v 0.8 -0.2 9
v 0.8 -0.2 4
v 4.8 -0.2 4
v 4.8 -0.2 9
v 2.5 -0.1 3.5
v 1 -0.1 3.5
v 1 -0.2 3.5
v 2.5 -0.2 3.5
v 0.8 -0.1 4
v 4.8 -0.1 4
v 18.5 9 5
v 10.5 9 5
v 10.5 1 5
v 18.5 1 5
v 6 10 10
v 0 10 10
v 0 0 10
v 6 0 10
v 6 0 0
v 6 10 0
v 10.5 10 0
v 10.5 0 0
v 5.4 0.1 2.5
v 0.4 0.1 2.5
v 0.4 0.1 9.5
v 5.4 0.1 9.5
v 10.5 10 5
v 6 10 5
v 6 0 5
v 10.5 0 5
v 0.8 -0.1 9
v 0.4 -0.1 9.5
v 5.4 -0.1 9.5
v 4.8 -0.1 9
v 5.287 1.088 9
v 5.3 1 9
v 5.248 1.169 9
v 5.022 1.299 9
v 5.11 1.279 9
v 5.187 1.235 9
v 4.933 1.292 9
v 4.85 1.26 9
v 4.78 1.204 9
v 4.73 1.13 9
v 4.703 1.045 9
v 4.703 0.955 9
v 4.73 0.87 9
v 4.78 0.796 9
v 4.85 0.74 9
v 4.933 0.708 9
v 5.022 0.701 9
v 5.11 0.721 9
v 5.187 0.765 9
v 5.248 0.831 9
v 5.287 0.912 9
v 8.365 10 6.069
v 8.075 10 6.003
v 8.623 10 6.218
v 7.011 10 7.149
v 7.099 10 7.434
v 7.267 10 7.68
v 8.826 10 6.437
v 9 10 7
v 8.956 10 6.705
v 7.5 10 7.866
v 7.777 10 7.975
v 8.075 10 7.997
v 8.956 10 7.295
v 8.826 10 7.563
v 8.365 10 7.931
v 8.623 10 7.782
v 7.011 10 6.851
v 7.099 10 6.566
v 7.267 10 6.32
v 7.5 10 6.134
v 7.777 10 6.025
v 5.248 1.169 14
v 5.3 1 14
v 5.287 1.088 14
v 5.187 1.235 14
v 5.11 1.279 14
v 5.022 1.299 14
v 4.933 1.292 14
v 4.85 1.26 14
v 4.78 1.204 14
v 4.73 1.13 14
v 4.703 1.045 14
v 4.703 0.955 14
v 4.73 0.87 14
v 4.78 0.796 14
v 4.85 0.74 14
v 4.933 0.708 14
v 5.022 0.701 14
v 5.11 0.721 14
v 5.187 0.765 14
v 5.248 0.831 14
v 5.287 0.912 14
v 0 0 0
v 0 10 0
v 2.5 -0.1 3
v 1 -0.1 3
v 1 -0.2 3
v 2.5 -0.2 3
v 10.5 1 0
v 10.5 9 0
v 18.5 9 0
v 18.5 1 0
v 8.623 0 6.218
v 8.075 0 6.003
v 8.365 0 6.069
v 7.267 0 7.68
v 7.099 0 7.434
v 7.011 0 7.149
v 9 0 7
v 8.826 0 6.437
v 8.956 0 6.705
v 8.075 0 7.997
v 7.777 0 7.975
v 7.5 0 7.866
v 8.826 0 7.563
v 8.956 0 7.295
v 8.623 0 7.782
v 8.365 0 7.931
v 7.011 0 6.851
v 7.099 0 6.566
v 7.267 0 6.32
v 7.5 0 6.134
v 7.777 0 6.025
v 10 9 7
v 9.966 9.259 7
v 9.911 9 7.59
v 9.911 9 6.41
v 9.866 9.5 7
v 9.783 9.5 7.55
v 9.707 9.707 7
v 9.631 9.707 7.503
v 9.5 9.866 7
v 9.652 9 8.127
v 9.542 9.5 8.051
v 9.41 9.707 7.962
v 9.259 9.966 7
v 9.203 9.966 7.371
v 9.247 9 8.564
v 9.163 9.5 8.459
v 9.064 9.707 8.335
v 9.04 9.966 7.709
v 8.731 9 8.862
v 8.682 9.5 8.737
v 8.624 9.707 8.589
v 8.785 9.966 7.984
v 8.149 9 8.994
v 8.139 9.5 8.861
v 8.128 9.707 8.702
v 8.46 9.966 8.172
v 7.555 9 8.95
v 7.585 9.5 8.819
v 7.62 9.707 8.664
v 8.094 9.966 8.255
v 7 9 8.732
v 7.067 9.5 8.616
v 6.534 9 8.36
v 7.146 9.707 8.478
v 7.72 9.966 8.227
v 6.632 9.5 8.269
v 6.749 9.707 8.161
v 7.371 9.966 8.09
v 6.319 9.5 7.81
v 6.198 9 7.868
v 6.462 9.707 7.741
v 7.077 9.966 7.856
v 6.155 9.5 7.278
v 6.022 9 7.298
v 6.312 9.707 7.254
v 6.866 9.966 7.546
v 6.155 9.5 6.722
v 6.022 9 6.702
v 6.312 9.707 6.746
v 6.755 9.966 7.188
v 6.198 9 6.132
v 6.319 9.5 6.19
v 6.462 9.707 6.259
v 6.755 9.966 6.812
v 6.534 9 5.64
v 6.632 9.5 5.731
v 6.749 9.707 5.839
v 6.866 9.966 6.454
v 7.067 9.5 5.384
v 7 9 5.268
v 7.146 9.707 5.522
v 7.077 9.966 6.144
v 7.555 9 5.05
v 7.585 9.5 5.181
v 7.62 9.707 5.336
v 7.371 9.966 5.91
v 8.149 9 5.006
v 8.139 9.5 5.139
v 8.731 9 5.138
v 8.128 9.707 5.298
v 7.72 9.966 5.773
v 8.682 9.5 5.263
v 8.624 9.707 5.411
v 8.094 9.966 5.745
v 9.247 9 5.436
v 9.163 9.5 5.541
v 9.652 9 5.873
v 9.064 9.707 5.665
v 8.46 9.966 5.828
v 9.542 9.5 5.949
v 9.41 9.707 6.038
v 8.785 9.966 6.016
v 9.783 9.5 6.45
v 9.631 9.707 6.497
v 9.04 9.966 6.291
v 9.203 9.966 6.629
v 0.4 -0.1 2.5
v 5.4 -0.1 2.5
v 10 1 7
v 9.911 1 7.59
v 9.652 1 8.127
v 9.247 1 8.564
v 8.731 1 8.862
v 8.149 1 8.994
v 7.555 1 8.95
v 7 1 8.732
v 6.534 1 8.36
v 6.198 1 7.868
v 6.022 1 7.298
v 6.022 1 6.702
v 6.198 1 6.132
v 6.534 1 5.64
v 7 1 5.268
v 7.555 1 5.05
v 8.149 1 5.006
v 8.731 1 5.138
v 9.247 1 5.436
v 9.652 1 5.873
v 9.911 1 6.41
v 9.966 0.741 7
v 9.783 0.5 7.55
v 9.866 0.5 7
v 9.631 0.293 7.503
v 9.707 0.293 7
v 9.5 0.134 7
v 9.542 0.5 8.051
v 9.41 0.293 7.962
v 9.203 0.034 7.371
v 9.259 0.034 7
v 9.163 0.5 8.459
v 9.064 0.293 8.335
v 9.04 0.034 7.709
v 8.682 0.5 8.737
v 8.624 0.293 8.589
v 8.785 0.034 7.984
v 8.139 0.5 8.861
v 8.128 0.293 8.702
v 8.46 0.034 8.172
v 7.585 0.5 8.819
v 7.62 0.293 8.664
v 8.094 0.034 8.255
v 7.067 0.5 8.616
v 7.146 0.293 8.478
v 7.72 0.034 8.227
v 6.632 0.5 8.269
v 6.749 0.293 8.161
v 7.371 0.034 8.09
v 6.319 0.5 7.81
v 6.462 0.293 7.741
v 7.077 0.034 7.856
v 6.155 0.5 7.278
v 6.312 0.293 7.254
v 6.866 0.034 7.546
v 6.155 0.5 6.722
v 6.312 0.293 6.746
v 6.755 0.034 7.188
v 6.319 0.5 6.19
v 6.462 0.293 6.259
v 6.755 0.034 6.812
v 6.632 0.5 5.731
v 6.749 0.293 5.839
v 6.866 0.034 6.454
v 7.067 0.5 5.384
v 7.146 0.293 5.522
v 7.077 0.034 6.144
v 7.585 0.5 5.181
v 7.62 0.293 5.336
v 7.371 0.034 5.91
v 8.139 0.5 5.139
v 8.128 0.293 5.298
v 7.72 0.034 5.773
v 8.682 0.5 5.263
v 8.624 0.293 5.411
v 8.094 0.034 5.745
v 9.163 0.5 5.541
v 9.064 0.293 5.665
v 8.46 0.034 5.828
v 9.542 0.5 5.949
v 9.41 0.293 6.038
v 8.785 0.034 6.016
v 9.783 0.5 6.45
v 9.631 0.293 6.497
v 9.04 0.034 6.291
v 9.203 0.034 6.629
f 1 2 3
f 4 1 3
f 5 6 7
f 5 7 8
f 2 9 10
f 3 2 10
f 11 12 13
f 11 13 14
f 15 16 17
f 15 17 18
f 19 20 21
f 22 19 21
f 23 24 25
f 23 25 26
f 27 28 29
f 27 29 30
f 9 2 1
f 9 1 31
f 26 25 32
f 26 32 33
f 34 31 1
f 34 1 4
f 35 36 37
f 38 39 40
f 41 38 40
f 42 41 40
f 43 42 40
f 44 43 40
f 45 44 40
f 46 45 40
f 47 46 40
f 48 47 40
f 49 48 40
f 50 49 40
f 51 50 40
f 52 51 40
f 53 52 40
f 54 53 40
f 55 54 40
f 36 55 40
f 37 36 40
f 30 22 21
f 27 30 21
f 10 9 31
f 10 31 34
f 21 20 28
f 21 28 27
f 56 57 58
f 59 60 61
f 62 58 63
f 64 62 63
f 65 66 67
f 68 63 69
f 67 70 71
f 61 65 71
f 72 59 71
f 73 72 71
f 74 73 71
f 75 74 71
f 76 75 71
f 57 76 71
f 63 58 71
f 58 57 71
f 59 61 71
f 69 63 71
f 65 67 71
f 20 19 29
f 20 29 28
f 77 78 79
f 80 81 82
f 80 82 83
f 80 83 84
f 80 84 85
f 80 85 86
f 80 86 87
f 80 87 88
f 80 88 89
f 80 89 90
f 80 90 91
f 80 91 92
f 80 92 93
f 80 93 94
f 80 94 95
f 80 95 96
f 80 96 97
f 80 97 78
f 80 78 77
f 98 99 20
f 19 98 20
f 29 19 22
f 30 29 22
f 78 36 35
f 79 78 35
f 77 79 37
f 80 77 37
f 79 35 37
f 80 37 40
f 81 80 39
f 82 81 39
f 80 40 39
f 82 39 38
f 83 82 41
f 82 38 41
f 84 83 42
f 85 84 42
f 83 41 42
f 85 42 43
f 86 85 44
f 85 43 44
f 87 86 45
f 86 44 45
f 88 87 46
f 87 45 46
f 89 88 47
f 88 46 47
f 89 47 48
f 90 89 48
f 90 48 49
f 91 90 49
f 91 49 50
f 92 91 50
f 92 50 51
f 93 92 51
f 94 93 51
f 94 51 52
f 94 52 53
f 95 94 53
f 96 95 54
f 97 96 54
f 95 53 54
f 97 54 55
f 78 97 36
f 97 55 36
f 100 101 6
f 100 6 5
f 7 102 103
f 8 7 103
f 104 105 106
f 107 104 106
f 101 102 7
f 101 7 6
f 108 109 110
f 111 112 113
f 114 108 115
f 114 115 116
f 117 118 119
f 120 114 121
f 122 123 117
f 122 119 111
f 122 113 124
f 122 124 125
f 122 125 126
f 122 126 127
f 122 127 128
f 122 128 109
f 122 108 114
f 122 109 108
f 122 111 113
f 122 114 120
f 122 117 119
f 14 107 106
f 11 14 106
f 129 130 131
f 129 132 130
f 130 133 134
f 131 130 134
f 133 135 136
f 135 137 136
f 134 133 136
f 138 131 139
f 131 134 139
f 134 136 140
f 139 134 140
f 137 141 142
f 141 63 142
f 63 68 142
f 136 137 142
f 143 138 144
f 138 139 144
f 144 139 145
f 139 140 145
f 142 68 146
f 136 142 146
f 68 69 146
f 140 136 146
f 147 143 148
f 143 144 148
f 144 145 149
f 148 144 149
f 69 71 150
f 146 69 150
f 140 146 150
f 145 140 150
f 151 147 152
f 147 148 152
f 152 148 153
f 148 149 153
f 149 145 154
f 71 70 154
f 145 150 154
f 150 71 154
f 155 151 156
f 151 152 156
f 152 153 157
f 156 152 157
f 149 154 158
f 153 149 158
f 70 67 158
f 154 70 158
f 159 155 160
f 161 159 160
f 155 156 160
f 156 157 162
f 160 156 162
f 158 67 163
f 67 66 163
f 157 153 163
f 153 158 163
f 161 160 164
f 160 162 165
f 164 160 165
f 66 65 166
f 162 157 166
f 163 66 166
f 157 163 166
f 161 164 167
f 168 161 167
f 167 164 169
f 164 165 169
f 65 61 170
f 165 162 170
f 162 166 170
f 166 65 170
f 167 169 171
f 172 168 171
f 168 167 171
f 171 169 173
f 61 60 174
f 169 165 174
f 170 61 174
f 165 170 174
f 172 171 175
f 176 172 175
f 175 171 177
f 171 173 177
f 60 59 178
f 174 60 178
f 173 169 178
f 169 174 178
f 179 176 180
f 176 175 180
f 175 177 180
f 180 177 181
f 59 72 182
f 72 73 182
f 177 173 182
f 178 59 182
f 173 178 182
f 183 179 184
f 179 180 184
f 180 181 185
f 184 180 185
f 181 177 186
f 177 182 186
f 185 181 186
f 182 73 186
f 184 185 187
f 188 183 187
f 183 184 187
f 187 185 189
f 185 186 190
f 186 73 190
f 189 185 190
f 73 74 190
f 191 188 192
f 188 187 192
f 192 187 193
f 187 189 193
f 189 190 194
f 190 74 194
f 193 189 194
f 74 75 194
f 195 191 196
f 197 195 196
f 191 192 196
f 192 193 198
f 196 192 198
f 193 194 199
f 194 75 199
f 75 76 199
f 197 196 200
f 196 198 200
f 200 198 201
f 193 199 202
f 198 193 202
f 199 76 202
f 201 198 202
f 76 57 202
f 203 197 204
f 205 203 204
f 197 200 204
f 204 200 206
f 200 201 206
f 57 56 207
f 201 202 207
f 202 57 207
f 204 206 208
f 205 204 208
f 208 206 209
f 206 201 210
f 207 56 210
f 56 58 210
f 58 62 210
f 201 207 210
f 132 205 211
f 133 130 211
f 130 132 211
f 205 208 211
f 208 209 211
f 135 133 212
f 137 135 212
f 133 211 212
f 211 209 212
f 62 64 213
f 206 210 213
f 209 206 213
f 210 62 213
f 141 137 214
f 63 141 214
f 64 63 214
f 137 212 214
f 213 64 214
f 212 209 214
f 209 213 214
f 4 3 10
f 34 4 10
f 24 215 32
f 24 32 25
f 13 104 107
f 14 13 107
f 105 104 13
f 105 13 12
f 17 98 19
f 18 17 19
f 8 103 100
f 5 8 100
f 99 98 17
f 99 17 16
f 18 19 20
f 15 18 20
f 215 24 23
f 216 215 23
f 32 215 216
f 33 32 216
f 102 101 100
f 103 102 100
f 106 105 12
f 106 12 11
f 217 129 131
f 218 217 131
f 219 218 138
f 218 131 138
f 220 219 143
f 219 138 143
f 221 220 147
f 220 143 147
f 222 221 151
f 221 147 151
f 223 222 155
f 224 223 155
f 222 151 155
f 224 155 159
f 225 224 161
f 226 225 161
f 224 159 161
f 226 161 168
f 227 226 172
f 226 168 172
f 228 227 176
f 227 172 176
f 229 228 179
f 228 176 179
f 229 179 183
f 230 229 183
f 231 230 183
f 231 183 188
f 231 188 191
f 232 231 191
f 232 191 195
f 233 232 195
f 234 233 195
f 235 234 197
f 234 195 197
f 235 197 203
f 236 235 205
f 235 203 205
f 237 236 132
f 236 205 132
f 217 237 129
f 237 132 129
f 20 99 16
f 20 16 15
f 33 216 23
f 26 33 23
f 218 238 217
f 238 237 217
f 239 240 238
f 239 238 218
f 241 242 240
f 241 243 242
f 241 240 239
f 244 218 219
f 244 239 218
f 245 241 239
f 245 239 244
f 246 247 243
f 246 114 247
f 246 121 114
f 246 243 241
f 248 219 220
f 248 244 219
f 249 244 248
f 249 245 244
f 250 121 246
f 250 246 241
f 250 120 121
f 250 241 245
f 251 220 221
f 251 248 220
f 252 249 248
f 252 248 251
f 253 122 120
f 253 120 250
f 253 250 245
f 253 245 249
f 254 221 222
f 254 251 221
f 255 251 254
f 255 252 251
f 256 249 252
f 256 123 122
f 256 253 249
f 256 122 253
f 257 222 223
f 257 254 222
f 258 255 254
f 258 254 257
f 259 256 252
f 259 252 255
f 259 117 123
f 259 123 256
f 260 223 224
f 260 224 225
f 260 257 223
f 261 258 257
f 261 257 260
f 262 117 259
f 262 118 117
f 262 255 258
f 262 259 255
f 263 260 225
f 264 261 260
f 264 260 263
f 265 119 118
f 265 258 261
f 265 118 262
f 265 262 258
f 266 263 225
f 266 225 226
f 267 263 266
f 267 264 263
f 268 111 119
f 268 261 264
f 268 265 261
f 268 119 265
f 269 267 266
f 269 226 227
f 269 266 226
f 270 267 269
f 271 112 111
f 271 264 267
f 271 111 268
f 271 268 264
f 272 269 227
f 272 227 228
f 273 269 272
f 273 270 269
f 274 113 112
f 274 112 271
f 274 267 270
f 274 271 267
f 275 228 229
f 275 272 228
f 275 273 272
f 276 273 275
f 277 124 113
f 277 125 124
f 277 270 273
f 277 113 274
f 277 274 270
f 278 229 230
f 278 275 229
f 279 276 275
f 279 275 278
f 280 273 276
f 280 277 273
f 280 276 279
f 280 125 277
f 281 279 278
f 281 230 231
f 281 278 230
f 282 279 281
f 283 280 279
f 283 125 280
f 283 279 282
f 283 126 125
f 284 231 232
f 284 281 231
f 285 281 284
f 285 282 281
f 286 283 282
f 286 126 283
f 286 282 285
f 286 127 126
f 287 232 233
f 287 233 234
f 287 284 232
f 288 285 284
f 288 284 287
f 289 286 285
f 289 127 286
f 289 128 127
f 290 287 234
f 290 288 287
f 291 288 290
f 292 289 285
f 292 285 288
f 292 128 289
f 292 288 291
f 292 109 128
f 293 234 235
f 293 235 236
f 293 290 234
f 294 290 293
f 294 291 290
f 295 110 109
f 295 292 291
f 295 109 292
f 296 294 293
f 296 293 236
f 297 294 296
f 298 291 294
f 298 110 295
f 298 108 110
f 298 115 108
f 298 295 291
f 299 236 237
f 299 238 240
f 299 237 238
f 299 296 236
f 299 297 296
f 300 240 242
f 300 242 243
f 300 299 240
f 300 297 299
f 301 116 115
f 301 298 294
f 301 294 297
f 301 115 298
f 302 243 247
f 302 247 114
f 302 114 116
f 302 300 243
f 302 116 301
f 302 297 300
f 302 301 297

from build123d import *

# Parameters (mm, degrees)
BOX_W             = 6
BOX_H             = 10
BOX_DEPTH         = 10
BOX001_W          = 4.5
BOX001_H          = 10
BOX001_DEPTH      = 5
CYLINDER_R        = 2
CYLINDER_DEPTH    = 10
FILLET_R          = 1
BOX002_W          = 4
BOX002_H          = 0.1
BOX002_DEPTH      = 5
BOX003_W          = 5
BOX003_H          = 0.2
BOX003_DEPTH      = 7
BOX004_W          = 1.5
BOX004_H          = 0.1
BOX004_DEPTH      = 0.5
CYLINDER001_R     = 0.3
CYLINDER001_DEPTH = 5
BOX005_W          = 8
BOX005_H          = 8
BOX005_DEPTH      = 5


with BuildPart() as cap_camio:
    # Box → Box (new body)
    with BuildSketch(Plane.XY):
        with Locations((3, 5)):
            Rectangle(BOX_W, BOX_H)
    extrude(amount=BOX_DEPTH)


with BuildPart() as darrer_camio:
    # Box001 → Box001 (new body)
    with BuildSketch(Plane(origin=(6, 0, 0), x_dir=(1, 0, 0), z_dir=(0, 0, 1))):
        with Locations((2.25, 5)):
            Rectangle(BOX001_W, BOX001_H)
    extrude(amount=BOX001_DEPTH)


with BuildPart() as combustible:
    # Cylinder → Cylinder (new body)
    with BuildSketch(Plane(origin=(8, 10, 7), x_dir=(1, 0, 0), z_dir=(0, -1, 0))):
        Circle(CYLINDER_R)
    extrude(amount=CYLINDER_DEPTH)

    # Fillet
    fillet_edges = [combustible.edges().sort_by_distance(p)[0] for p in [
        (6, 10, 7),
        (6, 0, 7),
    ]]
    fillet(fillet_edges, radius=FILLET_R)


with BuildPart() as finestra:
    # Box002 → Box002 (new body)
    with BuildSketch(Plane(origin=(0.8, -0.2, 4), x_dir=(1, 0, 0), z_dir=(0, 0, 1))):
        with Locations((2, 0.05)):
            Rectangle(BOX002_W, BOX002_H)
    extrude(amount=BOX002_DEPTH)


with BuildPart() as porta:
    # Box003 → Box003 (new body)
    with BuildSketch(Plane(origin=(0.4, -0.1, 2.5), x_dir=(1, 0, 0), z_dir=(0, 0, 1))):
        with Locations((2.5, 0.1)):
            Rectangle(BOX003_W, BOX003_H)
    extrude(amount=BOX003_DEPTH)


with BuildPart() as maneta:
    # Box004 → Box004 (new body)
    with BuildSketch(Plane(origin=(1, -0.2, 3), x_dir=(1, 0, 0), z_dir=(0, 0, 1))):
        with Locations((0.75, 0.05)):
            Rectangle(BOX004_W, BOX004_H)
    extrude(amount=BOX004_DEPTH)


with BuildPart() as cilindre001:
    # Cylinder001 → Cylinder001 (new body)
    with BuildSketch(Plane(origin=(5, 1, 9), x_dir=(1, 0, 0), z_dir=(0, 0, 1))):
        Circle(CYLINDER001_R)
    extrude(amount=CYLINDER001_DEPTH)


with BuildPart() as cub:
    # Box005 → Box005 (new body)
    with BuildSketch(Plane(origin=(10.5, 1, 0), x_dir=(1, 0, 0), z_dir=(0, 0, 1))):
        with Locations((4, 4)):
            Rectangle(BOX005_W, BOX005_H)
    extrude(amount=BOX005_DEPTH)


solid = Compound([cap_camio.part, darrer_camio.part, combustible.part, finestra.part, porta.part, maneta.part, cilindre001.part, cub.part])
